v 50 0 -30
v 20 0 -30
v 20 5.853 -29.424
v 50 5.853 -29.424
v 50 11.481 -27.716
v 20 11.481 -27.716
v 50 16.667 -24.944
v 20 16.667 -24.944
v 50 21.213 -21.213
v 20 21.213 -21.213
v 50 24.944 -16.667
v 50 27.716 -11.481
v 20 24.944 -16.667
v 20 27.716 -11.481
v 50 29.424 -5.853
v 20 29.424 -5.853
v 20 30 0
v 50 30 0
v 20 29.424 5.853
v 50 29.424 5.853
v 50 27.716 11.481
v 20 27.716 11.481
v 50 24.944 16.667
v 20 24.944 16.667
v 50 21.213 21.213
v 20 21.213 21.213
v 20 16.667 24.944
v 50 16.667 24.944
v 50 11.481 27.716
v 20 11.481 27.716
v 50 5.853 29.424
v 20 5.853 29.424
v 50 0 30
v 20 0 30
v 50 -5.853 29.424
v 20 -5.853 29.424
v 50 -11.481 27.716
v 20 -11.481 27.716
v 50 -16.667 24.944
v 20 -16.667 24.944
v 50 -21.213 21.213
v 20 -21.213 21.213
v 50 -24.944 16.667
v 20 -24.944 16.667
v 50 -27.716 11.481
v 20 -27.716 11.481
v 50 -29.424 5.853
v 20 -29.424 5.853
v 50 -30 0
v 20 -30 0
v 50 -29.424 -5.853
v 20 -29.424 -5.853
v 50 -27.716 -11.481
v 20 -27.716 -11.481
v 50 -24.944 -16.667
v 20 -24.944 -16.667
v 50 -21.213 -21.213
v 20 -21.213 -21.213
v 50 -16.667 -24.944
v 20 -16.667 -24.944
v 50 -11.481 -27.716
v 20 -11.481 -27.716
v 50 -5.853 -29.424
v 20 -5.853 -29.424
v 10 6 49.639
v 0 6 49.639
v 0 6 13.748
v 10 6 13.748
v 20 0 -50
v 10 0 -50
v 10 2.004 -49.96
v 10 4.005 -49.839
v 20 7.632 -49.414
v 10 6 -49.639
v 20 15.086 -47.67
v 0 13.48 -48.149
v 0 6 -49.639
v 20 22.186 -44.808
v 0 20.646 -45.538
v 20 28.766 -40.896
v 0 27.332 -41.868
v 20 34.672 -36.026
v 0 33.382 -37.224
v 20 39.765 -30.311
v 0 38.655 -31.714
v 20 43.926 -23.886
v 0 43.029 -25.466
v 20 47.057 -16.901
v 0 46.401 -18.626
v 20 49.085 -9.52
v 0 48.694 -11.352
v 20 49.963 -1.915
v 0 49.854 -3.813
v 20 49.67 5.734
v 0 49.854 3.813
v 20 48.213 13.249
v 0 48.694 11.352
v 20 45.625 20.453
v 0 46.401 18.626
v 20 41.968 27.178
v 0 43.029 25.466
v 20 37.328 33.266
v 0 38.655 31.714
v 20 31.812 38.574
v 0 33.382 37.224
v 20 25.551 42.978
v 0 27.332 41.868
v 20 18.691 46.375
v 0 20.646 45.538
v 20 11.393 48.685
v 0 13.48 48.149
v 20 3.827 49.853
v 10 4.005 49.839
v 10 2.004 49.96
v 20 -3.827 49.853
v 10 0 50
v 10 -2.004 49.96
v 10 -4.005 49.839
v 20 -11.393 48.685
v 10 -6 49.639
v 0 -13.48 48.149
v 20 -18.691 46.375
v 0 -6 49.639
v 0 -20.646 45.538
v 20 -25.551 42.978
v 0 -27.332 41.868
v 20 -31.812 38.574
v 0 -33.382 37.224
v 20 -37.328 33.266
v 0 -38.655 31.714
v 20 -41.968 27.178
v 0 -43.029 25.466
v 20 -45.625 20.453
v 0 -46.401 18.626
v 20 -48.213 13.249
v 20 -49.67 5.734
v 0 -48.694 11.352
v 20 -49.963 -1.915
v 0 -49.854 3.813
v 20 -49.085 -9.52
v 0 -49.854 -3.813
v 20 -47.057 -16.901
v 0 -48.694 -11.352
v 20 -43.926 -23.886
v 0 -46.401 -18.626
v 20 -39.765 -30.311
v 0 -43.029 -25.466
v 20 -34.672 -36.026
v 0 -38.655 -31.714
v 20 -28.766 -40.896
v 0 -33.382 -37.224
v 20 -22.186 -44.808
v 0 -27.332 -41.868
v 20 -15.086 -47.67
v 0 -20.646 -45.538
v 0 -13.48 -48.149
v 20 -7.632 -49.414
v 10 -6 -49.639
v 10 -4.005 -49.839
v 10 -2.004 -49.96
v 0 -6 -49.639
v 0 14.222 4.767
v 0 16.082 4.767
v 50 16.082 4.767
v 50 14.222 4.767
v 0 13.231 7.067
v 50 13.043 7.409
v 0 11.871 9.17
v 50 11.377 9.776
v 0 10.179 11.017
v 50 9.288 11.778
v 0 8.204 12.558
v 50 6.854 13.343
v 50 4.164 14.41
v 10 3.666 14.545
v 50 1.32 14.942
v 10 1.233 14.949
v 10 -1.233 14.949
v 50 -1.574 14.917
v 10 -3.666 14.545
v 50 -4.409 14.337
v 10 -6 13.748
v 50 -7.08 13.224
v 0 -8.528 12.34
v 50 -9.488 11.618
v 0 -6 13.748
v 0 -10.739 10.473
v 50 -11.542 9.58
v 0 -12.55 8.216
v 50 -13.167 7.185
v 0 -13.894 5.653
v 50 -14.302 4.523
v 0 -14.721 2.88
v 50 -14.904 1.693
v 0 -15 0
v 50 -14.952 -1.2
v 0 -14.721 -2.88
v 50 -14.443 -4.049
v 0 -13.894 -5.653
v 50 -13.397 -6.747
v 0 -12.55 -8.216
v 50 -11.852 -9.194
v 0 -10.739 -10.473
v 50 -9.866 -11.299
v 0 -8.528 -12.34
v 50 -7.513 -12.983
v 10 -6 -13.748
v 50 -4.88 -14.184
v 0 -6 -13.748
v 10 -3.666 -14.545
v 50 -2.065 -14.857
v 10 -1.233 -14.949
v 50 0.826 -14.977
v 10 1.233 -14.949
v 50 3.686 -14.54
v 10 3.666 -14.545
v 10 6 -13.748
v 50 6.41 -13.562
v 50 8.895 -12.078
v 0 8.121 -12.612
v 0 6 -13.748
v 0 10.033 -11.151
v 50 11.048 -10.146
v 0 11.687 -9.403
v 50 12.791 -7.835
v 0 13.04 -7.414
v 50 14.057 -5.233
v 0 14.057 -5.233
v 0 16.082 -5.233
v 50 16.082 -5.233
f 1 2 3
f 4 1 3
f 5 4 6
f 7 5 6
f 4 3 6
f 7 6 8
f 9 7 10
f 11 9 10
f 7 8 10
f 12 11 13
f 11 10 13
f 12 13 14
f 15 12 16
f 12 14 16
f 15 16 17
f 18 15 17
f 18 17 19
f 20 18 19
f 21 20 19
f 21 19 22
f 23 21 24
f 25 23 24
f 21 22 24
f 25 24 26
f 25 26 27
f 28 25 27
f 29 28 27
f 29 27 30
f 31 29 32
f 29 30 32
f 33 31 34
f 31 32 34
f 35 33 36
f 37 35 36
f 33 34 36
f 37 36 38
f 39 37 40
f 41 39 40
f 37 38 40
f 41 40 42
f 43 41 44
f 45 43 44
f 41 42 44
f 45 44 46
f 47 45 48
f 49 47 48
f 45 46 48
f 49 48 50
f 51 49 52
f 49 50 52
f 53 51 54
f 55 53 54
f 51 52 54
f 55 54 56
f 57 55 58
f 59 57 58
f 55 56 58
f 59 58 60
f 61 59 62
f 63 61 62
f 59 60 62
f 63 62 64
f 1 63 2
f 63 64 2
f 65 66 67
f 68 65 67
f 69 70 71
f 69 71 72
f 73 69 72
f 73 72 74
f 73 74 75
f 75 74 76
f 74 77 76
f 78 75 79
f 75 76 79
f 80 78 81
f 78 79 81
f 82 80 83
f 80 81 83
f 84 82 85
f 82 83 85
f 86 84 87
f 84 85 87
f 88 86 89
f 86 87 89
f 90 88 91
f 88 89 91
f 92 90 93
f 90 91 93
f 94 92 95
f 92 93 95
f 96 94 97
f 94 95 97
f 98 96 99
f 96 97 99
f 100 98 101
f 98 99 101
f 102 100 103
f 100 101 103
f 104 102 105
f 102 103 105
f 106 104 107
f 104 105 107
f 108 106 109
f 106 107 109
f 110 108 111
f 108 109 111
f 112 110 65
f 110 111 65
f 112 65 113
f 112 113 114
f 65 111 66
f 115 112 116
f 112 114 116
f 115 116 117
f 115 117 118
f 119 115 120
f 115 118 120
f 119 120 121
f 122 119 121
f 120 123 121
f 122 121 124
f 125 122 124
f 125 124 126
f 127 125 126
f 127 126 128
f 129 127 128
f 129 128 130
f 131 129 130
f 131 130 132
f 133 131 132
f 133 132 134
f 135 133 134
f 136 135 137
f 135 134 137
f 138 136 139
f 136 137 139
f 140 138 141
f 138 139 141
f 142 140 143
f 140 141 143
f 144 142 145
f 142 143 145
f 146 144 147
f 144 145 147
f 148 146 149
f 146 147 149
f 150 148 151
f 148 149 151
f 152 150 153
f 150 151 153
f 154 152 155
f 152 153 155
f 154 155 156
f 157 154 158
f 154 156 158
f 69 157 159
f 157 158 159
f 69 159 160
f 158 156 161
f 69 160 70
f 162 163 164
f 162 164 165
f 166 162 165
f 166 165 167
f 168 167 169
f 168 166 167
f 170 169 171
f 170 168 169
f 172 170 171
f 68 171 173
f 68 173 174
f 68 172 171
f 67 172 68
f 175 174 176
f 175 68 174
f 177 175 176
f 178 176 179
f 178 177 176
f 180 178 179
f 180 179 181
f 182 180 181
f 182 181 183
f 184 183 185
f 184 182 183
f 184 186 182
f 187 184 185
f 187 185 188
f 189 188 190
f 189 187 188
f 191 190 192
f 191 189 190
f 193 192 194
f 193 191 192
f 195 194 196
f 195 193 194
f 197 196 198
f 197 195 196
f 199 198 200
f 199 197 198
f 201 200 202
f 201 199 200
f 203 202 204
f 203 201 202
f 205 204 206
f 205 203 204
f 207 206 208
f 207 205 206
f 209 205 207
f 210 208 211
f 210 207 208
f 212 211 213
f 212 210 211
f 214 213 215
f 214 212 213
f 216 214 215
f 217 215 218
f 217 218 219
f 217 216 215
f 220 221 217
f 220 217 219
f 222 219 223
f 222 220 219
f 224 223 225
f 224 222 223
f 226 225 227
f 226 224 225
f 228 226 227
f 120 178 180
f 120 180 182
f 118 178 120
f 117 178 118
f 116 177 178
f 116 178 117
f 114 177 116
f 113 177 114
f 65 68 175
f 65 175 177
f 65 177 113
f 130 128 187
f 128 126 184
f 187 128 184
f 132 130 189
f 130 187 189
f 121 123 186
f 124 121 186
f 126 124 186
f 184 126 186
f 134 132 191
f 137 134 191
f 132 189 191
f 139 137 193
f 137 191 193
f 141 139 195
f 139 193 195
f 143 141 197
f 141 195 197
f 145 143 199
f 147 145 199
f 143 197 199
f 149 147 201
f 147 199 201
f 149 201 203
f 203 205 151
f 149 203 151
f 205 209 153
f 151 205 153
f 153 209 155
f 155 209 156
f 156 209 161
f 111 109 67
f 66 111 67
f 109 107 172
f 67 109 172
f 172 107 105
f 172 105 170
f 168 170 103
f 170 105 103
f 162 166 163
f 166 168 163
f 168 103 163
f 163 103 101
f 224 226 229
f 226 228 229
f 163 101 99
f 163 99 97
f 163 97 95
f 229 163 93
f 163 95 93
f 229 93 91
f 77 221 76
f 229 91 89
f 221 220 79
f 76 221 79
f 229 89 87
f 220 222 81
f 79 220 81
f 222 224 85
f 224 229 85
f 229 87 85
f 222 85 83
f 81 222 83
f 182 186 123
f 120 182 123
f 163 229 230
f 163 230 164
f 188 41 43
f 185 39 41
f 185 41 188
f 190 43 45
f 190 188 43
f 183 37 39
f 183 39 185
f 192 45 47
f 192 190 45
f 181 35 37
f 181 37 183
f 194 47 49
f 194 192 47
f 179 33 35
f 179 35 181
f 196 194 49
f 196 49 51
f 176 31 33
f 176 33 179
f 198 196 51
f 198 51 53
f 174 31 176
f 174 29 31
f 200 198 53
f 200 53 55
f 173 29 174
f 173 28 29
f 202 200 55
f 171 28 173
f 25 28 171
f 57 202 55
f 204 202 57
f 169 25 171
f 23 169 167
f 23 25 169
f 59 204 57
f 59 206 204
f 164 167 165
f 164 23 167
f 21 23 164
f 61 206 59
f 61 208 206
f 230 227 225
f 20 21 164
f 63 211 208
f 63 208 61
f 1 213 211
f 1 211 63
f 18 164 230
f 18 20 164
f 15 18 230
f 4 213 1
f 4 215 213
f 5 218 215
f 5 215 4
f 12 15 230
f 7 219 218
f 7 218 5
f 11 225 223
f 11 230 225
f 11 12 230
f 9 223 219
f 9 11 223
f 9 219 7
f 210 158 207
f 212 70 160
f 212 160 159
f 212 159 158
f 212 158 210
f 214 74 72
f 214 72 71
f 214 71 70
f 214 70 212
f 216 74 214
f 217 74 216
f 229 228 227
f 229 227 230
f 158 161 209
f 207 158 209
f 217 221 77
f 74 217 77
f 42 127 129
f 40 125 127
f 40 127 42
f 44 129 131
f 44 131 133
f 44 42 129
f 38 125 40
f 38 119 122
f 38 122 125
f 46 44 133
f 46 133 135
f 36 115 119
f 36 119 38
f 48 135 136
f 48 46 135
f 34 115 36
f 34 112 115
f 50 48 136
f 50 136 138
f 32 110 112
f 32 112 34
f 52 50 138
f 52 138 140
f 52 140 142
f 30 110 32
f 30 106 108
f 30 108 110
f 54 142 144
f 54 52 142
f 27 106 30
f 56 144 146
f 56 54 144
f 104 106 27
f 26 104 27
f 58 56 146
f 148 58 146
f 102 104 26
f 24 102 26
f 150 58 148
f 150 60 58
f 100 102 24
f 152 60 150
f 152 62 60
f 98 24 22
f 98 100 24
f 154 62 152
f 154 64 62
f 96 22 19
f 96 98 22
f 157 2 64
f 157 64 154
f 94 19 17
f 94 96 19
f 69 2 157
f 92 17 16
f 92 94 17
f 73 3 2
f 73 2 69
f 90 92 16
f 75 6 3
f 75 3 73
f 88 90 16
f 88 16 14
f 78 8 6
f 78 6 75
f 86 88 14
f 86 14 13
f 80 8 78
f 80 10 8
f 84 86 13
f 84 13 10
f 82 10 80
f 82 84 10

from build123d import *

# Parameters (mm, degrees)
SKETCH1_R           = 50
BOSS_EXTRUDE1_DEPTH = 20
SKETCH2_R           = 30
BOSS_EXTRUDE2_DEPTH = 30
CUT_EXTRUDE1_DEPTH  = 50
CUT_EXTRUDE2_DEPTH  = 10


with BuildPart() as part:
    # Sketch1 → Boss-Extrude1 (new body)
    with BuildSketch(Plane(origin=(0, 0, 0), x_dir=(0, 0, -1), z_dir=(1, 0, 0))):
        Circle(SKETCH1_R)
    extrude(amount=BOSS_EXTRUDE1_DEPTH)

    # Sketch2 → Boss-Extrude2 (add)
    with BuildSketch(Plane(origin=(20, 0, 0), x_dir=(0, 0, -1), z_dir=(1, 0, 0))):
        Circle(SKETCH2_R)
    extrude(amount=BOSS_EXTRUDE2_DEPTH)

    # Sketch3 → Cut-Extrude1 (cut)
    with BuildSketch(Plane.ZY):
        with BuildLine():
            Line((-5.23333009, 16.081894033), (4.76666991, 16.081894033))
            Line((4.76666991, 16.081894033), (4.76666991, 14.222477209))
            ThreePointArc((4.76666991, 14.222477209), (0.247488145, -14.997958182), (-5.23333009, 14.05746265))
            Line((-5.23333009, 14.05746265), (-5.23333009, 16.081894033))
        make_face()
    extrude(amount=-CUT_EXTRUDE1_DEPTH, mode=Mode.SUBTRACT)

    # Sketch4 → Cut-Extrude2 (cut)
    with BuildSketch(Plane.ZY):
        with BuildLine():
            Line((-13.747727085, 6), (-49.638694584, 6))
            ThreePointArc((-49.638694584, 6), (-50, 0), (-49.638694584, -6))
            Line((-49.638694584, -6), (-13.747727085, -6))
            ThreePointArc((-13.747727085, -6), (-15, 0), (-13.747727085, 6))
        make_face()
        with BuildLine():
            ThreePointArc((50, 0), (49.90959191, 3.005434312), (49.638694584, 6))
            Line((49.638694584, 6), (13.747727085, 6))
            ThreePointArc((13.747727085, 6), (15, 0), (13.747727085, -6))
            Line((13.747727085, -6), (49.638694584, -6))
            ThreePointArc((49.638694584, -6), (49.90959191, -3.005434312), (50, 0))
        make_face()
    extrude(amount=-CUT_EXTRUDE2_DEPTH, mode=Mode.SUBTRACT)


solid = part.part
